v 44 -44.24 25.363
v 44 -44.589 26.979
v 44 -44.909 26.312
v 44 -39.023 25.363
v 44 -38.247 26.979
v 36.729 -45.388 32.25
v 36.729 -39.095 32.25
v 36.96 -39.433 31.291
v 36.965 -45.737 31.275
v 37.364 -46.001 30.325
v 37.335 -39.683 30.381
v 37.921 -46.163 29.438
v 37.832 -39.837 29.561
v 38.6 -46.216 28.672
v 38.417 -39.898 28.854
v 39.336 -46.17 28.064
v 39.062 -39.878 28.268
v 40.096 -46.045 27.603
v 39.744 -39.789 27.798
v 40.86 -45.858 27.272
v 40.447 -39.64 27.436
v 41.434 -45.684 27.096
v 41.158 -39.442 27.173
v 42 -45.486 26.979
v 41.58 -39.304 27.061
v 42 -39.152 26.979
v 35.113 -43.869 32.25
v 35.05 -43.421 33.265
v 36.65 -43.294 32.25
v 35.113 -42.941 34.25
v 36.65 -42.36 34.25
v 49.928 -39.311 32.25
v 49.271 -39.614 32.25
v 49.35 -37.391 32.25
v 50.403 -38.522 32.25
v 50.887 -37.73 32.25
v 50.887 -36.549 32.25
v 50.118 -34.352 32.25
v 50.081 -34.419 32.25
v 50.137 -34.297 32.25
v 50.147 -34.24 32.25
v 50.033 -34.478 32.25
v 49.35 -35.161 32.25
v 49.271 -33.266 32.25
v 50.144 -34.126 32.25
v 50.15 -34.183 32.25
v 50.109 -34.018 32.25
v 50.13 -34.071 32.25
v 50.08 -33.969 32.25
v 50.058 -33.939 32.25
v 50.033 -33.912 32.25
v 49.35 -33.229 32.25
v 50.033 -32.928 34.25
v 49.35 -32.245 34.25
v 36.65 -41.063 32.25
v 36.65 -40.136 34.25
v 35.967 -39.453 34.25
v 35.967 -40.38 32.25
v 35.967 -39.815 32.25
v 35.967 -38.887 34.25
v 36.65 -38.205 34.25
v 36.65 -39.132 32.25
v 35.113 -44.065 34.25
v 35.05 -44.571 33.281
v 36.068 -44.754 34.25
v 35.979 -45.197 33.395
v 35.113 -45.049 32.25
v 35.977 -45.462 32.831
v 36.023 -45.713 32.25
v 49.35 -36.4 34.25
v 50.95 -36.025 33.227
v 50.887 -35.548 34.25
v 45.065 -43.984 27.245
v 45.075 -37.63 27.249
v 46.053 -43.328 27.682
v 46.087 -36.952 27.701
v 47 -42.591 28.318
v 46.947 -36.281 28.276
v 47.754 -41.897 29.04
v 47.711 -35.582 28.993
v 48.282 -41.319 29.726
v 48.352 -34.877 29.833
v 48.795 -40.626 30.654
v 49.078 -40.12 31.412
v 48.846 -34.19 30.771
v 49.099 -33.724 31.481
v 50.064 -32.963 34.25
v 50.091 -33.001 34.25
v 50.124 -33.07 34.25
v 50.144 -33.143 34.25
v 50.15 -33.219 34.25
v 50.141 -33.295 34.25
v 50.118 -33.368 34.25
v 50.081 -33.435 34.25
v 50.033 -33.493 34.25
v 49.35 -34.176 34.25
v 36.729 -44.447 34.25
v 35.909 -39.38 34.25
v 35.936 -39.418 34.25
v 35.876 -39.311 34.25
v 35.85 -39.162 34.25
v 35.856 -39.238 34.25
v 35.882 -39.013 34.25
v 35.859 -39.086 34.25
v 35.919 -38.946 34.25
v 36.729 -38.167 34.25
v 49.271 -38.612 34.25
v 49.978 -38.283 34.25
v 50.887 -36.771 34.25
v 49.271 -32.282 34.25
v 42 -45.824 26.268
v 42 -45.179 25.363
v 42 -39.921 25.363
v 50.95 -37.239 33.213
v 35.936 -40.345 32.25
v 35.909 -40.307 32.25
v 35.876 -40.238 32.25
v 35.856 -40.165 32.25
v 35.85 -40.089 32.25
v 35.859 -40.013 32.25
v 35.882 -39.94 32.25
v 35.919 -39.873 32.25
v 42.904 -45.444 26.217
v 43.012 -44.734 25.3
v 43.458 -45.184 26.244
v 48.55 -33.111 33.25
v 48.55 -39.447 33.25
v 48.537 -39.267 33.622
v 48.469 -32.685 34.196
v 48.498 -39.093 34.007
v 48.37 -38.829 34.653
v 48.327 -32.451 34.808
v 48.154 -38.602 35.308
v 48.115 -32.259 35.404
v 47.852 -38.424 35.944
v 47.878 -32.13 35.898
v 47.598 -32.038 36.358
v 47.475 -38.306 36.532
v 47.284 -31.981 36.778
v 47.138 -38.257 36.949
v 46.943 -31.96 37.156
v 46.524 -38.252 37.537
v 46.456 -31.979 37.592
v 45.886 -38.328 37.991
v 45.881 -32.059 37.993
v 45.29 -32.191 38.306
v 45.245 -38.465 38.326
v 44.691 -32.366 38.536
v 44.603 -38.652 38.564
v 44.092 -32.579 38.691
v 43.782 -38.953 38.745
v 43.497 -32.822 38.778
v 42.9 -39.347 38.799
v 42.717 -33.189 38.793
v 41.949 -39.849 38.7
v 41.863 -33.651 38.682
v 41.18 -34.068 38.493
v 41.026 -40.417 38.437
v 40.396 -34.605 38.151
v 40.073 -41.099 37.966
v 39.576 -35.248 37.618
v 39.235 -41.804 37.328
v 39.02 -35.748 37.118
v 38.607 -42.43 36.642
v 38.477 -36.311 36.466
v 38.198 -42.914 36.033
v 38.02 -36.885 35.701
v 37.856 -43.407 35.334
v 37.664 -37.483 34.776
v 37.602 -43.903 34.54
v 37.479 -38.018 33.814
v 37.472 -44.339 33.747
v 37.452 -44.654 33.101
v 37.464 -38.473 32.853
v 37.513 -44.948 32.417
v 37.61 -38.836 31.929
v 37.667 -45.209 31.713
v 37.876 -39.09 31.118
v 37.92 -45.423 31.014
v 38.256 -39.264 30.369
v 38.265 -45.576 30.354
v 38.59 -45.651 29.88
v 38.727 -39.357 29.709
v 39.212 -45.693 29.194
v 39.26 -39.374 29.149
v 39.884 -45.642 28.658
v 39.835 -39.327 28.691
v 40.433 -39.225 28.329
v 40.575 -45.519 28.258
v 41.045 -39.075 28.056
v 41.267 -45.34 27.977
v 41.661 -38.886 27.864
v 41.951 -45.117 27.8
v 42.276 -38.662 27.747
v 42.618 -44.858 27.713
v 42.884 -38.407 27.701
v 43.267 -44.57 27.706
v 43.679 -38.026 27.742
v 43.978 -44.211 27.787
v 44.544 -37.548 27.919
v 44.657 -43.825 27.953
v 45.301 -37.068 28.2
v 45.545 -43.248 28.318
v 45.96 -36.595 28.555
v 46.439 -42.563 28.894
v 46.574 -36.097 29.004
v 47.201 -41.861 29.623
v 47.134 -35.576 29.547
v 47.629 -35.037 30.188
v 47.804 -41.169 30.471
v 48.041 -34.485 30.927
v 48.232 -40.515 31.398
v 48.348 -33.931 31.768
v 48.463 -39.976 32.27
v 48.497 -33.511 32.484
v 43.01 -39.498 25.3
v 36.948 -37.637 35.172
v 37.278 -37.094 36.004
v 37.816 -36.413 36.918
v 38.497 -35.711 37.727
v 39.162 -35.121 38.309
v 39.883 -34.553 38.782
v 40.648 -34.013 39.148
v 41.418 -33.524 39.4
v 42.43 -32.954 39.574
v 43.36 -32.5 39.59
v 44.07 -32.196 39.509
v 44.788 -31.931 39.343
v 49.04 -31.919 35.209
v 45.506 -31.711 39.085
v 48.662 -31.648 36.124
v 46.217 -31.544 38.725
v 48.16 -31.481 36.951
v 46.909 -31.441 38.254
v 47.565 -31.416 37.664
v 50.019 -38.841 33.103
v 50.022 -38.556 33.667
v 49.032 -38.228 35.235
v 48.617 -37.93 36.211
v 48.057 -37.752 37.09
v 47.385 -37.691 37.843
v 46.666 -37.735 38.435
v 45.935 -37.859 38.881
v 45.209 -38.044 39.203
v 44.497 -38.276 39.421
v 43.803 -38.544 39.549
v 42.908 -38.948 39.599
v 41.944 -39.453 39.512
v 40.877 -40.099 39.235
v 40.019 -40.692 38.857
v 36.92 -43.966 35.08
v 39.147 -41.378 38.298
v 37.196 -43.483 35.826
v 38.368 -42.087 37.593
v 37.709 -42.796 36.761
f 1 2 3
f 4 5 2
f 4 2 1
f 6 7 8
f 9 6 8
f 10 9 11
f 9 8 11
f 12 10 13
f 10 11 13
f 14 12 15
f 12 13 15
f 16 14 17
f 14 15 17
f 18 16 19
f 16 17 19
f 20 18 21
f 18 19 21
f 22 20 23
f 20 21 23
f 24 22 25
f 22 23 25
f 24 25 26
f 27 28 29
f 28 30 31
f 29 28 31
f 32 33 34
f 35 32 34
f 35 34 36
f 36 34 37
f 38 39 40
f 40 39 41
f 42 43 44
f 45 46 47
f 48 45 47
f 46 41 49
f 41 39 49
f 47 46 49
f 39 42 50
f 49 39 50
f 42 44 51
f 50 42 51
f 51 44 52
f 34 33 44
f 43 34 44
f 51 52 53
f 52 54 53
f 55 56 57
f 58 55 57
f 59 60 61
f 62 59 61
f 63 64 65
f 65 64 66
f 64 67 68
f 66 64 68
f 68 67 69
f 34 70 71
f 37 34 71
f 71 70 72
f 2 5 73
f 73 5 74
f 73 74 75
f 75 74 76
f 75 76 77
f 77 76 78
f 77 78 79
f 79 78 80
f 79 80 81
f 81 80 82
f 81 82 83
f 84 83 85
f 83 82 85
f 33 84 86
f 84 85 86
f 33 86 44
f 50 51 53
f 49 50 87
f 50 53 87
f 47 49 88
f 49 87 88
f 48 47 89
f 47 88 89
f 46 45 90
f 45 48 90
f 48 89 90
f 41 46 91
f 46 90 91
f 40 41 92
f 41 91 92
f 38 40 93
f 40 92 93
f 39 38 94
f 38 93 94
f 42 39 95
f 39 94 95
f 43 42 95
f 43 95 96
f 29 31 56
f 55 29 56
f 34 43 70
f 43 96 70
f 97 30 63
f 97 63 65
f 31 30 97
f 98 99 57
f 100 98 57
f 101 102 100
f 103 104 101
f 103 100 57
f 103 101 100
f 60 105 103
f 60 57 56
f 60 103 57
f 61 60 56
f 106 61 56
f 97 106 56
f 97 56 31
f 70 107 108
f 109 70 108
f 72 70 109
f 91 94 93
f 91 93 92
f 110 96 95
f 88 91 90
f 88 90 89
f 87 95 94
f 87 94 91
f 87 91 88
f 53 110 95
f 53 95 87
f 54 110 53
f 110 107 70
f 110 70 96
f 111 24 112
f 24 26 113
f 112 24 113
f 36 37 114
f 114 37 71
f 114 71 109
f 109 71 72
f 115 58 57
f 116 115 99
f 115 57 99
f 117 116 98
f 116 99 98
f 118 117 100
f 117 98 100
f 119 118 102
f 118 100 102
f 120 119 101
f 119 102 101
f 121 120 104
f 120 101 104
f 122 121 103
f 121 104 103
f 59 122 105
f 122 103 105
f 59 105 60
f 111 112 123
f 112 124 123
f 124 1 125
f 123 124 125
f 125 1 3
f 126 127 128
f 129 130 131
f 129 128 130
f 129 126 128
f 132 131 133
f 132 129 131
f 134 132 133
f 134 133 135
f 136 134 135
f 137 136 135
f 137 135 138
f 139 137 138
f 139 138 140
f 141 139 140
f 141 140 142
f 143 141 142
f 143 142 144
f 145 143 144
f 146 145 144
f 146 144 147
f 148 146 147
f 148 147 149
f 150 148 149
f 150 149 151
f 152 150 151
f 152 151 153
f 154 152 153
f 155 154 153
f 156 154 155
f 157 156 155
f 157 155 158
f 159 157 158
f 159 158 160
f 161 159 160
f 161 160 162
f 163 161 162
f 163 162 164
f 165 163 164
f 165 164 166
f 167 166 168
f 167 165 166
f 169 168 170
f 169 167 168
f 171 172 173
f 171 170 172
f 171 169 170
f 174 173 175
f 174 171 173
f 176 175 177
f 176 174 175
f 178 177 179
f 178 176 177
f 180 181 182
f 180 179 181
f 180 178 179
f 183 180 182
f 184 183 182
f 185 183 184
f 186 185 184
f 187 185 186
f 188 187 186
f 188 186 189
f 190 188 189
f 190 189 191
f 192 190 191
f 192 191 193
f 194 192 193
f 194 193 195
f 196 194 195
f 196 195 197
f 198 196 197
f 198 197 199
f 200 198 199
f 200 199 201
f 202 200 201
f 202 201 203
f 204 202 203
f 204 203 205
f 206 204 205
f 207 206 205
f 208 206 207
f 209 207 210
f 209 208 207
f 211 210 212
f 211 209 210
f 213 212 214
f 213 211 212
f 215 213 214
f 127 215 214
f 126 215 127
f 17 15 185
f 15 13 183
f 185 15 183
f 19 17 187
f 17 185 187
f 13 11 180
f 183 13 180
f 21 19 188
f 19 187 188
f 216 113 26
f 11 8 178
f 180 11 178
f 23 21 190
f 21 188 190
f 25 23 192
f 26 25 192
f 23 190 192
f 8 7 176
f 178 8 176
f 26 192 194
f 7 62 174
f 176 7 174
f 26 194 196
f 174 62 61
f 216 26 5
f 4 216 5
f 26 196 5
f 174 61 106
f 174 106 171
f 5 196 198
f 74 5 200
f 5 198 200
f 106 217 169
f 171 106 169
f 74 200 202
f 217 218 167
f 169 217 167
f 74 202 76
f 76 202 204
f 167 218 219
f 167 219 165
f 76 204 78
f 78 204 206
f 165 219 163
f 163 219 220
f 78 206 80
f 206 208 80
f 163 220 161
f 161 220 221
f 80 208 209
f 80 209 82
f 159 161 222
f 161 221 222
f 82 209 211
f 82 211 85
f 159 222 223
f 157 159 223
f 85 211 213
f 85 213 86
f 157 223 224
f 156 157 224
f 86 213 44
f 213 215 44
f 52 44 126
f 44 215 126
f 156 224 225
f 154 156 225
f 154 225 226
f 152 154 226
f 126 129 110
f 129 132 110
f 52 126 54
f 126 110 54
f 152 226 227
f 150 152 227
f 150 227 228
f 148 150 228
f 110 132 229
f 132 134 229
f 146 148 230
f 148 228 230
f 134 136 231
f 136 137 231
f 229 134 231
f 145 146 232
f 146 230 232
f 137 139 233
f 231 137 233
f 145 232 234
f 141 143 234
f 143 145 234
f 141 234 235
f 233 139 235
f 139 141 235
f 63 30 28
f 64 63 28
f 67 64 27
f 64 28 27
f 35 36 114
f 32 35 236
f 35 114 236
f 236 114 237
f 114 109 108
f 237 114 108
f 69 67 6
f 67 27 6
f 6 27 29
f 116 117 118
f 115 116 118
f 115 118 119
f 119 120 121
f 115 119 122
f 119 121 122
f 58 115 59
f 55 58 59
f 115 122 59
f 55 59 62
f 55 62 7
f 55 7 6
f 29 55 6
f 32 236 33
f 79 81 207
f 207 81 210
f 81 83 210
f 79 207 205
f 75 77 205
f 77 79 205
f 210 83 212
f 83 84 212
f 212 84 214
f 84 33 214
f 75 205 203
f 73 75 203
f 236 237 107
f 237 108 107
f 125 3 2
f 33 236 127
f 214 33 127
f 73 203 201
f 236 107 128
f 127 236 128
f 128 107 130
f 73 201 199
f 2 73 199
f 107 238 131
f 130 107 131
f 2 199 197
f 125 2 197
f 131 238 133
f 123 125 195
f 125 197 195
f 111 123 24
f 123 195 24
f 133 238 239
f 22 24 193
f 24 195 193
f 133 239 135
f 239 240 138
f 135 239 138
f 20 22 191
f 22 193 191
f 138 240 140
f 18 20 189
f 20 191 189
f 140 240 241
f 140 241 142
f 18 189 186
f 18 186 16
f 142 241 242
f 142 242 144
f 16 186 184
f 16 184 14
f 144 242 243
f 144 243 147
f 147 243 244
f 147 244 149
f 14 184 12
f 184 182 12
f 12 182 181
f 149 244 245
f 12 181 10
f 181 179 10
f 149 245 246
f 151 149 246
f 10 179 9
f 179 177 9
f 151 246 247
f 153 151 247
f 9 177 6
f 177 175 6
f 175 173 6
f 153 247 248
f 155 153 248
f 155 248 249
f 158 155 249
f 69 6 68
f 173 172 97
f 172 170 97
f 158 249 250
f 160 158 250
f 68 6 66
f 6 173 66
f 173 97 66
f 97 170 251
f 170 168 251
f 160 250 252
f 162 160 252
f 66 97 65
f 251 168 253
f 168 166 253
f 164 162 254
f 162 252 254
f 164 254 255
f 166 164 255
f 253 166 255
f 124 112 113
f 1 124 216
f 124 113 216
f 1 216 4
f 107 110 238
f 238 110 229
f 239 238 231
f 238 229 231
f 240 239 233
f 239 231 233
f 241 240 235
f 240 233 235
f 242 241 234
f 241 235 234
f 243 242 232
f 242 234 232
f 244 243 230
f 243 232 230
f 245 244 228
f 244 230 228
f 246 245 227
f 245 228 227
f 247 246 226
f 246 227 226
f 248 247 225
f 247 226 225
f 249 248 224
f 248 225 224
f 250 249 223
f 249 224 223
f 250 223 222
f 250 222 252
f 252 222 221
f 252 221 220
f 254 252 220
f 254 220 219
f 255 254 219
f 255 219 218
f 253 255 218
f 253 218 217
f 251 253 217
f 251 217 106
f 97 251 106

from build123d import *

# Parameters (mm, degrees)
SKETCH004_R       = 6.35
PAD001_DEPTH      = 85
PAD002_DEPTH      = 85
SKETCH016_R       = 5.55
POCKET_DEPTH      = 0.001
POCKET_DEPTH_BACK = 85.001
CHAMFER001_SIZE   = 1


with BuildPart() as part:
    # Sketch004 → Pad001 (new body)
    with BuildSketch(Plane.XZ):
        with Locations((43, 33.25)):
            Circle(SKETCH004_R)
    extrude(amount=PAD001_DEPTH)

    # Sketch017 → Pad002 (join)
    with BuildSketch(Plane.XZ):
        with BuildLine():
            Line((35.113144, 34.25), (50.886856, 34.25))
            ThreePointArc((50.886856, 32.25), (50.95, 33.25), (50.886856, 34.25))
            Line((44, 32.25), (50.886856, 32.25))
            Line((44, 32.25), (44, 25.363144))
            ThreePointArc((42, 25.363144), (43, 25.3), (44, 25.363144))
            Line((42, 32.25), (42, 25.363144))
            Line((35.113144, 32.25), (42, 32.25))
            ThreePointArc((35.113144, 34.25), (35.05, 33.25), (35.113144, 32.25))
        make_face()
    extrude(amount=PAD002_DEPTH)

    # Sketch016 → Pocket (cut, two sides)
    with BuildSketch(Plane.XZ) as pocket_sk:
        with Locations((43, 33.25)):
            Circle(SKETCH016_R)
    extrude(amount=-POCKET_DEPTH, mode=Mode.SUBTRACT)
    extrude(pocket_sk.sketch, amount=POCKET_DEPTH_BACK, mode=Mode.SUBTRACT)

    # Sketch014 (on DatumPlane) → SubtractiveLoft001 section 0
    with BuildSketch(Plane.XY.offset(10)):
        with BuildLine():
            Line((-2, 2), (-2, -87))
            Line((-2, -87), (76.866516, -87))
            Line((76.866516, -38.996654), (76.866516, -87))
            Line((0, -70.790865), (76.866516, -38.996654))
            Line((0, -70.790865), (0, -59.815429))
            ThreePointArc((0, -59.815429), (18.580156, -58.2705), (36.65, -53.678146))
            Line((36.65, -53.678146), (36.65, -51.378146))
            Line((36.65, -51.378146), (35.967157, -50.695303))
            ThreePointArc((35.967157, -50.129618), (35.85, -50.41246), (35.967157, -50.695303))
            Line((35.967157, -50.129618), (36.65, -49.446775))
            Line((36.65, -49.446775), (49.35, -44.182166))
            Line((50.032843, -44.865009), (49.35, -44.182166))
            ThreePointArc((50.032843, -45.430695), (50.15, -45.147852), (50.032843, -44.865009))
            Line((49.35, -46.113537), (50.032843, -45.430695))
            Line((49.35, -48.413537), (49.35, -46.113537))
            ThreePointArc((49.35, -48.413537), (64.17388, -39.716528), (77.5, -28.862961))
            Line((77.5, 2), (77.5, -28.862961))
            Line((-2, 2), (77.5, 2))
        make_face()
    # Sketch015 (on DatumPlane) → SubtractiveLoft001 section 1
    with BuildSketch(Plane.XY.offset(42)):
        with BuildLine():
            Line((-2, 2), (-2, -87))
            Line((-2, -87), (63.5, -87))
            Line((63.5, -87), (63.5, -27.765276))
            Line((0, -58.577105), (63.5, -27.765276))
            Line((0, -58.577105), (0, -45.815429))
            ThreePointArc((0, -45.815429), (18.663063, -44.031199), (36.65, -38.743146))
            Line((36.65, -38.743146), (36.65, -36.543146))
            Line((36.65, -36.543146), (35.967157, -35.860304))
            ThreePointArc((35.967157, -35.294618), (35.85, -35.577461), (35.967157, -35.860304))
            Line((35.967157, -35.294618), (36.65, -34.611775))
            Line((49.35, -28.429747), (36.65, -34.611775))
            Line((50.032843, -29.11259), (49.35, -28.429747))
            ThreePointArc((50.032843, -29.678275), (50.15, -29.395433), (50.032843, -29.11259))
            Line((49.35, -30.361118), (50.032843, -29.678275))
            Line((49.35, -30.361118), (49.35, -32.561118))
            ThreePointArc((49.35, -32.561118), (56.643736, -27.899157), (63.5, -22.614831))
            Line((63.5, 2), (63.5, -22.614831))
            Line((63.5, 2), (-2, 2))
        make_face()
    loft(mode=Mode.SUBTRACT)

    # Chamfer001
    chamfer001_edges = [part.edges().sort_by_distance(p)[0] for p in [
        (35.050008, -45.689757, 33.261359),
        (43.011121, -45.833884, 25.300008),
        (50.934027, -38.597846, 32.746296),
    ]]
    chamfer(chamfer001_edges, length=CHAMFER001_SIZE)


solid = part.part
